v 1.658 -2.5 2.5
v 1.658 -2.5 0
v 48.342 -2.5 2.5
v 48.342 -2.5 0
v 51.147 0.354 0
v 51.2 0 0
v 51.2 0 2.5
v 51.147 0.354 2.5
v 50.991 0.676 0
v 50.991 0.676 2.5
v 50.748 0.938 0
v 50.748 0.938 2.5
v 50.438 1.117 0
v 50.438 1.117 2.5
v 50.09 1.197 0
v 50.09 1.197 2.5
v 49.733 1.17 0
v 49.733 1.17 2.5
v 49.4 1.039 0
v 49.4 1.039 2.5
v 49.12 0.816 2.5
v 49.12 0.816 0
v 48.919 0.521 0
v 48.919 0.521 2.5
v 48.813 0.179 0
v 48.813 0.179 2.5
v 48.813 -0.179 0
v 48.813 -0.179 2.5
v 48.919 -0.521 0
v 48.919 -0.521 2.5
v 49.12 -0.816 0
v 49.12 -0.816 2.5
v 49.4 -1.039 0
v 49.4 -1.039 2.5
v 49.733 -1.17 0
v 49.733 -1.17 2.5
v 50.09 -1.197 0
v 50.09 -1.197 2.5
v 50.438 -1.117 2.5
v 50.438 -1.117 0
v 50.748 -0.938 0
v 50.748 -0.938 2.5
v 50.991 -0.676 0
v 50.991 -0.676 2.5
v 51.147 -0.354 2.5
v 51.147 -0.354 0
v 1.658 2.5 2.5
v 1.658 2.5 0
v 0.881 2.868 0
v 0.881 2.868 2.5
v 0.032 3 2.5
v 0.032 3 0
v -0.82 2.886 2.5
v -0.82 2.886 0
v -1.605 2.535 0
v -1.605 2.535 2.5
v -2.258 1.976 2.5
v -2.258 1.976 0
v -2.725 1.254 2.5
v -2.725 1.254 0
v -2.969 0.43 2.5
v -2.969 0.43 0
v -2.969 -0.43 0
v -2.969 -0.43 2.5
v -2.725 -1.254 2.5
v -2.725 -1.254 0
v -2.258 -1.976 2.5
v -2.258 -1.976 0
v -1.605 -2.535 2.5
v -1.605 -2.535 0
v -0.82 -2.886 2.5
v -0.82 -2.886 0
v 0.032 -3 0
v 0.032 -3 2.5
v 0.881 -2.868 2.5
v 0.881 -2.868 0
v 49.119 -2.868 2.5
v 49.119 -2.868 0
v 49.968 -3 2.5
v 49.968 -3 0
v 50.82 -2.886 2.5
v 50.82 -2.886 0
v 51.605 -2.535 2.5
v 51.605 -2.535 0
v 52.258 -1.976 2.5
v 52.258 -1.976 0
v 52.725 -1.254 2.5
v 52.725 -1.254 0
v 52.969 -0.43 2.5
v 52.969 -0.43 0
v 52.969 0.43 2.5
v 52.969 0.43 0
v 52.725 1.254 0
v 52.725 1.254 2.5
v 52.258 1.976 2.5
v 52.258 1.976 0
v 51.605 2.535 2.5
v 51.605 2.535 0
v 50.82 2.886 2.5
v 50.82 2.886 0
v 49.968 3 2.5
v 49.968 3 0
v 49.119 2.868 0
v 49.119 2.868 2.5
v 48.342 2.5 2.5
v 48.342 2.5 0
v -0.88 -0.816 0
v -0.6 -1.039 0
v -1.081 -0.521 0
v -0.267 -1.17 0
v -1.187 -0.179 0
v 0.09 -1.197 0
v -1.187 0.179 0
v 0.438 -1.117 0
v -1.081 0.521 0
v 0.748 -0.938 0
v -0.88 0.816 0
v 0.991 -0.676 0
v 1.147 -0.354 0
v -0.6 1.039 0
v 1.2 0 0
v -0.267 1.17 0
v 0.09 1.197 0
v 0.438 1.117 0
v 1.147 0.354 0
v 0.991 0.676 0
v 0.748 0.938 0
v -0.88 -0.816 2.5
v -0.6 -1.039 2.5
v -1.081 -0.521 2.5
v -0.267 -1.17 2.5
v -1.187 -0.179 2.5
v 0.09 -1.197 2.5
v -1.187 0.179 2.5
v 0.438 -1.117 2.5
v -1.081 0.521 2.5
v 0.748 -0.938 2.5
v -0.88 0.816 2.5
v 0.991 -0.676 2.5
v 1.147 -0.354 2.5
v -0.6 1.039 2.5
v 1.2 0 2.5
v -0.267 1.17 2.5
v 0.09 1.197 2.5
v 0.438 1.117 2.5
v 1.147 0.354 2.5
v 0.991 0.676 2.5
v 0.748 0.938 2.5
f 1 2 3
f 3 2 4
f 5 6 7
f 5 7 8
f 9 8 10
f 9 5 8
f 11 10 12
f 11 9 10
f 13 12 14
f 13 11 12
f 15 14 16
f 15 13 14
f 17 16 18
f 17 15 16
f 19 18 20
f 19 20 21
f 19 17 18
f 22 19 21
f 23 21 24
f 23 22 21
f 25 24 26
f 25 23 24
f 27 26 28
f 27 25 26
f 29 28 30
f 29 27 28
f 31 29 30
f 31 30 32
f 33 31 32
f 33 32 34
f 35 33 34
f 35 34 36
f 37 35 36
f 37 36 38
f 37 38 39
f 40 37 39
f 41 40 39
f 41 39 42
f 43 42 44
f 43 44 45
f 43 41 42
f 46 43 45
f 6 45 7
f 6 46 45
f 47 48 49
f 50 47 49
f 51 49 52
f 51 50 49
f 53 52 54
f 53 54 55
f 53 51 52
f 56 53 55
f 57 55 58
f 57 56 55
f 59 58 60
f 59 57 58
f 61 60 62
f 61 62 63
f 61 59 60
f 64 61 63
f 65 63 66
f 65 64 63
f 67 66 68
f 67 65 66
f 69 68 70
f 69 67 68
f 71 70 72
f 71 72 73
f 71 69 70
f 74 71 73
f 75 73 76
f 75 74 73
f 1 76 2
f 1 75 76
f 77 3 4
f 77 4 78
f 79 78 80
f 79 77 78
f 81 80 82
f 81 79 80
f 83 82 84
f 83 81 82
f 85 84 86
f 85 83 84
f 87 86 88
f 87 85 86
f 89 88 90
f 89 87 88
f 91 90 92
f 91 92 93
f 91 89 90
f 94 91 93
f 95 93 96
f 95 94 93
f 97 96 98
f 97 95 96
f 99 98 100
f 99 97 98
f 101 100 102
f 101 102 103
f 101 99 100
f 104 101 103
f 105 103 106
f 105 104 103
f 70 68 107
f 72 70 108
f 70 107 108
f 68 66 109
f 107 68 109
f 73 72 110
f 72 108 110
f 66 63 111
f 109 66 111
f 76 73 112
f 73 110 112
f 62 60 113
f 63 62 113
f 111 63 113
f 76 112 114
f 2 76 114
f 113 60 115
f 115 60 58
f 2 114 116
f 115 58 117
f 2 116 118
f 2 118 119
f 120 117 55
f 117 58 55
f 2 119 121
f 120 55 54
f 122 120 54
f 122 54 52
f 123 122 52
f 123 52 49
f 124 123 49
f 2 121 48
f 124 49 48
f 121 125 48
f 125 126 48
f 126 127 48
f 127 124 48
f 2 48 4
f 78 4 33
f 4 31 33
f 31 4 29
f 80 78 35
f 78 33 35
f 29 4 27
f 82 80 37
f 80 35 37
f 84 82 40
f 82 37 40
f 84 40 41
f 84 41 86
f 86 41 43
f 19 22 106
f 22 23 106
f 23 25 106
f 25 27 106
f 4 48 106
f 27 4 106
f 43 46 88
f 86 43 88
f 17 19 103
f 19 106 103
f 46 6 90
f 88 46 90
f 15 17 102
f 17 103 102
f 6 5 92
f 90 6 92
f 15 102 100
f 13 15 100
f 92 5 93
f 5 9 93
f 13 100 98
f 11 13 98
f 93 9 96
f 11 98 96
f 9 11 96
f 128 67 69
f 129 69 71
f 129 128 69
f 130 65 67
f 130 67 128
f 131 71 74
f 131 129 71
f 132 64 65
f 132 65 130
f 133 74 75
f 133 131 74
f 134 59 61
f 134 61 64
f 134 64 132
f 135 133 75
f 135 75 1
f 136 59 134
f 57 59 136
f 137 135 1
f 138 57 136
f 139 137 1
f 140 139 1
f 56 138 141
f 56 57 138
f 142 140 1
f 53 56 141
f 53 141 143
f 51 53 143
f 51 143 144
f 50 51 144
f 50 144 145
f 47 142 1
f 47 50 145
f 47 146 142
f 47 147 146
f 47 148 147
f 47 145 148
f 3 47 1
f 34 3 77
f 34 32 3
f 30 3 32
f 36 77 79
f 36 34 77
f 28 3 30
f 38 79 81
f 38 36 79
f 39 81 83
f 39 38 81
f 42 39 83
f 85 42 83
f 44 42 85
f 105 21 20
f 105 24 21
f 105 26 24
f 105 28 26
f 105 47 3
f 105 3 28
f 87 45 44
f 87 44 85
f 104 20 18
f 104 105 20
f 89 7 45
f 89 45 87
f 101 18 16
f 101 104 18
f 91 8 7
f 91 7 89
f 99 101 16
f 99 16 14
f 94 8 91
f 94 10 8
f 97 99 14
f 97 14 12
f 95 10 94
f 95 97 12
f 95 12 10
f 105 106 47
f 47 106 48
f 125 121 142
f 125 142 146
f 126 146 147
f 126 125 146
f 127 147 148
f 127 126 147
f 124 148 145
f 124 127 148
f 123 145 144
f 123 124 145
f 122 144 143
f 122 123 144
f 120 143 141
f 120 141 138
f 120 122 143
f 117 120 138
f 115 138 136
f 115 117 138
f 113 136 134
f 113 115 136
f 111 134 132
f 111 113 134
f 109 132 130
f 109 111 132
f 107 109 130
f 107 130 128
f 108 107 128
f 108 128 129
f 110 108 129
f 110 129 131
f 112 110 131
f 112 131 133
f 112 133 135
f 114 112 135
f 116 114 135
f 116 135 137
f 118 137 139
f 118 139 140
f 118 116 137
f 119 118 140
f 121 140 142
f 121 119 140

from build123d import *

# Parameters (mm, degrees)
SKETCH14_R          = 1.2
BOSS_EXTRUDE1_DEPTH = 2.5
SKETCH15_R          = 3
SKETCH15_R_2        = 1.2
BOSS_EXTRUDE2_DEPTH = 2.5


with BuildPart() as part:
    # Sketch14 → Boss-Extrude1 (new body)
    with BuildSketch(Plane.XY):
        with BuildLine():
            Line((50, 2.5), (0, 2.5))
            ThreePointArc((0, 2.5), (-2.5, 0), (0, -2.5))
            Line((0, -2.5), (50, -2.5))
            ThreePointArc((50, -2.5), (52.5, 0), (50, 2.5))
        make_face()
        Circle(SKETCH14_R, mode=Mode.SUBTRACT)
        with Locations((50, 0)):
            Circle(SKETCH14_R, mode=Mode.SUBTRACT)
    extrude(amount=BOSS_EXTRUDE1_DEPTH)

    # Sketch15 → Boss-Extrude2 (add)
    with BuildSketch(Plane.XY.offset(2.5)):
        with Locations((50, 0)):
            Circle(SKETCH15_R)
        with Locations((50, 0)):
            Circle(SKETCH15_R_2, mode=Mode.SUBTRACT)
        Circle(SKETCH15_R)
        Circle(SKETCH15_R_2, mode=Mode.SUBTRACT)
    extrude(amount=-BOSS_EXTRUDE2_DEPTH)


solid = part.part
